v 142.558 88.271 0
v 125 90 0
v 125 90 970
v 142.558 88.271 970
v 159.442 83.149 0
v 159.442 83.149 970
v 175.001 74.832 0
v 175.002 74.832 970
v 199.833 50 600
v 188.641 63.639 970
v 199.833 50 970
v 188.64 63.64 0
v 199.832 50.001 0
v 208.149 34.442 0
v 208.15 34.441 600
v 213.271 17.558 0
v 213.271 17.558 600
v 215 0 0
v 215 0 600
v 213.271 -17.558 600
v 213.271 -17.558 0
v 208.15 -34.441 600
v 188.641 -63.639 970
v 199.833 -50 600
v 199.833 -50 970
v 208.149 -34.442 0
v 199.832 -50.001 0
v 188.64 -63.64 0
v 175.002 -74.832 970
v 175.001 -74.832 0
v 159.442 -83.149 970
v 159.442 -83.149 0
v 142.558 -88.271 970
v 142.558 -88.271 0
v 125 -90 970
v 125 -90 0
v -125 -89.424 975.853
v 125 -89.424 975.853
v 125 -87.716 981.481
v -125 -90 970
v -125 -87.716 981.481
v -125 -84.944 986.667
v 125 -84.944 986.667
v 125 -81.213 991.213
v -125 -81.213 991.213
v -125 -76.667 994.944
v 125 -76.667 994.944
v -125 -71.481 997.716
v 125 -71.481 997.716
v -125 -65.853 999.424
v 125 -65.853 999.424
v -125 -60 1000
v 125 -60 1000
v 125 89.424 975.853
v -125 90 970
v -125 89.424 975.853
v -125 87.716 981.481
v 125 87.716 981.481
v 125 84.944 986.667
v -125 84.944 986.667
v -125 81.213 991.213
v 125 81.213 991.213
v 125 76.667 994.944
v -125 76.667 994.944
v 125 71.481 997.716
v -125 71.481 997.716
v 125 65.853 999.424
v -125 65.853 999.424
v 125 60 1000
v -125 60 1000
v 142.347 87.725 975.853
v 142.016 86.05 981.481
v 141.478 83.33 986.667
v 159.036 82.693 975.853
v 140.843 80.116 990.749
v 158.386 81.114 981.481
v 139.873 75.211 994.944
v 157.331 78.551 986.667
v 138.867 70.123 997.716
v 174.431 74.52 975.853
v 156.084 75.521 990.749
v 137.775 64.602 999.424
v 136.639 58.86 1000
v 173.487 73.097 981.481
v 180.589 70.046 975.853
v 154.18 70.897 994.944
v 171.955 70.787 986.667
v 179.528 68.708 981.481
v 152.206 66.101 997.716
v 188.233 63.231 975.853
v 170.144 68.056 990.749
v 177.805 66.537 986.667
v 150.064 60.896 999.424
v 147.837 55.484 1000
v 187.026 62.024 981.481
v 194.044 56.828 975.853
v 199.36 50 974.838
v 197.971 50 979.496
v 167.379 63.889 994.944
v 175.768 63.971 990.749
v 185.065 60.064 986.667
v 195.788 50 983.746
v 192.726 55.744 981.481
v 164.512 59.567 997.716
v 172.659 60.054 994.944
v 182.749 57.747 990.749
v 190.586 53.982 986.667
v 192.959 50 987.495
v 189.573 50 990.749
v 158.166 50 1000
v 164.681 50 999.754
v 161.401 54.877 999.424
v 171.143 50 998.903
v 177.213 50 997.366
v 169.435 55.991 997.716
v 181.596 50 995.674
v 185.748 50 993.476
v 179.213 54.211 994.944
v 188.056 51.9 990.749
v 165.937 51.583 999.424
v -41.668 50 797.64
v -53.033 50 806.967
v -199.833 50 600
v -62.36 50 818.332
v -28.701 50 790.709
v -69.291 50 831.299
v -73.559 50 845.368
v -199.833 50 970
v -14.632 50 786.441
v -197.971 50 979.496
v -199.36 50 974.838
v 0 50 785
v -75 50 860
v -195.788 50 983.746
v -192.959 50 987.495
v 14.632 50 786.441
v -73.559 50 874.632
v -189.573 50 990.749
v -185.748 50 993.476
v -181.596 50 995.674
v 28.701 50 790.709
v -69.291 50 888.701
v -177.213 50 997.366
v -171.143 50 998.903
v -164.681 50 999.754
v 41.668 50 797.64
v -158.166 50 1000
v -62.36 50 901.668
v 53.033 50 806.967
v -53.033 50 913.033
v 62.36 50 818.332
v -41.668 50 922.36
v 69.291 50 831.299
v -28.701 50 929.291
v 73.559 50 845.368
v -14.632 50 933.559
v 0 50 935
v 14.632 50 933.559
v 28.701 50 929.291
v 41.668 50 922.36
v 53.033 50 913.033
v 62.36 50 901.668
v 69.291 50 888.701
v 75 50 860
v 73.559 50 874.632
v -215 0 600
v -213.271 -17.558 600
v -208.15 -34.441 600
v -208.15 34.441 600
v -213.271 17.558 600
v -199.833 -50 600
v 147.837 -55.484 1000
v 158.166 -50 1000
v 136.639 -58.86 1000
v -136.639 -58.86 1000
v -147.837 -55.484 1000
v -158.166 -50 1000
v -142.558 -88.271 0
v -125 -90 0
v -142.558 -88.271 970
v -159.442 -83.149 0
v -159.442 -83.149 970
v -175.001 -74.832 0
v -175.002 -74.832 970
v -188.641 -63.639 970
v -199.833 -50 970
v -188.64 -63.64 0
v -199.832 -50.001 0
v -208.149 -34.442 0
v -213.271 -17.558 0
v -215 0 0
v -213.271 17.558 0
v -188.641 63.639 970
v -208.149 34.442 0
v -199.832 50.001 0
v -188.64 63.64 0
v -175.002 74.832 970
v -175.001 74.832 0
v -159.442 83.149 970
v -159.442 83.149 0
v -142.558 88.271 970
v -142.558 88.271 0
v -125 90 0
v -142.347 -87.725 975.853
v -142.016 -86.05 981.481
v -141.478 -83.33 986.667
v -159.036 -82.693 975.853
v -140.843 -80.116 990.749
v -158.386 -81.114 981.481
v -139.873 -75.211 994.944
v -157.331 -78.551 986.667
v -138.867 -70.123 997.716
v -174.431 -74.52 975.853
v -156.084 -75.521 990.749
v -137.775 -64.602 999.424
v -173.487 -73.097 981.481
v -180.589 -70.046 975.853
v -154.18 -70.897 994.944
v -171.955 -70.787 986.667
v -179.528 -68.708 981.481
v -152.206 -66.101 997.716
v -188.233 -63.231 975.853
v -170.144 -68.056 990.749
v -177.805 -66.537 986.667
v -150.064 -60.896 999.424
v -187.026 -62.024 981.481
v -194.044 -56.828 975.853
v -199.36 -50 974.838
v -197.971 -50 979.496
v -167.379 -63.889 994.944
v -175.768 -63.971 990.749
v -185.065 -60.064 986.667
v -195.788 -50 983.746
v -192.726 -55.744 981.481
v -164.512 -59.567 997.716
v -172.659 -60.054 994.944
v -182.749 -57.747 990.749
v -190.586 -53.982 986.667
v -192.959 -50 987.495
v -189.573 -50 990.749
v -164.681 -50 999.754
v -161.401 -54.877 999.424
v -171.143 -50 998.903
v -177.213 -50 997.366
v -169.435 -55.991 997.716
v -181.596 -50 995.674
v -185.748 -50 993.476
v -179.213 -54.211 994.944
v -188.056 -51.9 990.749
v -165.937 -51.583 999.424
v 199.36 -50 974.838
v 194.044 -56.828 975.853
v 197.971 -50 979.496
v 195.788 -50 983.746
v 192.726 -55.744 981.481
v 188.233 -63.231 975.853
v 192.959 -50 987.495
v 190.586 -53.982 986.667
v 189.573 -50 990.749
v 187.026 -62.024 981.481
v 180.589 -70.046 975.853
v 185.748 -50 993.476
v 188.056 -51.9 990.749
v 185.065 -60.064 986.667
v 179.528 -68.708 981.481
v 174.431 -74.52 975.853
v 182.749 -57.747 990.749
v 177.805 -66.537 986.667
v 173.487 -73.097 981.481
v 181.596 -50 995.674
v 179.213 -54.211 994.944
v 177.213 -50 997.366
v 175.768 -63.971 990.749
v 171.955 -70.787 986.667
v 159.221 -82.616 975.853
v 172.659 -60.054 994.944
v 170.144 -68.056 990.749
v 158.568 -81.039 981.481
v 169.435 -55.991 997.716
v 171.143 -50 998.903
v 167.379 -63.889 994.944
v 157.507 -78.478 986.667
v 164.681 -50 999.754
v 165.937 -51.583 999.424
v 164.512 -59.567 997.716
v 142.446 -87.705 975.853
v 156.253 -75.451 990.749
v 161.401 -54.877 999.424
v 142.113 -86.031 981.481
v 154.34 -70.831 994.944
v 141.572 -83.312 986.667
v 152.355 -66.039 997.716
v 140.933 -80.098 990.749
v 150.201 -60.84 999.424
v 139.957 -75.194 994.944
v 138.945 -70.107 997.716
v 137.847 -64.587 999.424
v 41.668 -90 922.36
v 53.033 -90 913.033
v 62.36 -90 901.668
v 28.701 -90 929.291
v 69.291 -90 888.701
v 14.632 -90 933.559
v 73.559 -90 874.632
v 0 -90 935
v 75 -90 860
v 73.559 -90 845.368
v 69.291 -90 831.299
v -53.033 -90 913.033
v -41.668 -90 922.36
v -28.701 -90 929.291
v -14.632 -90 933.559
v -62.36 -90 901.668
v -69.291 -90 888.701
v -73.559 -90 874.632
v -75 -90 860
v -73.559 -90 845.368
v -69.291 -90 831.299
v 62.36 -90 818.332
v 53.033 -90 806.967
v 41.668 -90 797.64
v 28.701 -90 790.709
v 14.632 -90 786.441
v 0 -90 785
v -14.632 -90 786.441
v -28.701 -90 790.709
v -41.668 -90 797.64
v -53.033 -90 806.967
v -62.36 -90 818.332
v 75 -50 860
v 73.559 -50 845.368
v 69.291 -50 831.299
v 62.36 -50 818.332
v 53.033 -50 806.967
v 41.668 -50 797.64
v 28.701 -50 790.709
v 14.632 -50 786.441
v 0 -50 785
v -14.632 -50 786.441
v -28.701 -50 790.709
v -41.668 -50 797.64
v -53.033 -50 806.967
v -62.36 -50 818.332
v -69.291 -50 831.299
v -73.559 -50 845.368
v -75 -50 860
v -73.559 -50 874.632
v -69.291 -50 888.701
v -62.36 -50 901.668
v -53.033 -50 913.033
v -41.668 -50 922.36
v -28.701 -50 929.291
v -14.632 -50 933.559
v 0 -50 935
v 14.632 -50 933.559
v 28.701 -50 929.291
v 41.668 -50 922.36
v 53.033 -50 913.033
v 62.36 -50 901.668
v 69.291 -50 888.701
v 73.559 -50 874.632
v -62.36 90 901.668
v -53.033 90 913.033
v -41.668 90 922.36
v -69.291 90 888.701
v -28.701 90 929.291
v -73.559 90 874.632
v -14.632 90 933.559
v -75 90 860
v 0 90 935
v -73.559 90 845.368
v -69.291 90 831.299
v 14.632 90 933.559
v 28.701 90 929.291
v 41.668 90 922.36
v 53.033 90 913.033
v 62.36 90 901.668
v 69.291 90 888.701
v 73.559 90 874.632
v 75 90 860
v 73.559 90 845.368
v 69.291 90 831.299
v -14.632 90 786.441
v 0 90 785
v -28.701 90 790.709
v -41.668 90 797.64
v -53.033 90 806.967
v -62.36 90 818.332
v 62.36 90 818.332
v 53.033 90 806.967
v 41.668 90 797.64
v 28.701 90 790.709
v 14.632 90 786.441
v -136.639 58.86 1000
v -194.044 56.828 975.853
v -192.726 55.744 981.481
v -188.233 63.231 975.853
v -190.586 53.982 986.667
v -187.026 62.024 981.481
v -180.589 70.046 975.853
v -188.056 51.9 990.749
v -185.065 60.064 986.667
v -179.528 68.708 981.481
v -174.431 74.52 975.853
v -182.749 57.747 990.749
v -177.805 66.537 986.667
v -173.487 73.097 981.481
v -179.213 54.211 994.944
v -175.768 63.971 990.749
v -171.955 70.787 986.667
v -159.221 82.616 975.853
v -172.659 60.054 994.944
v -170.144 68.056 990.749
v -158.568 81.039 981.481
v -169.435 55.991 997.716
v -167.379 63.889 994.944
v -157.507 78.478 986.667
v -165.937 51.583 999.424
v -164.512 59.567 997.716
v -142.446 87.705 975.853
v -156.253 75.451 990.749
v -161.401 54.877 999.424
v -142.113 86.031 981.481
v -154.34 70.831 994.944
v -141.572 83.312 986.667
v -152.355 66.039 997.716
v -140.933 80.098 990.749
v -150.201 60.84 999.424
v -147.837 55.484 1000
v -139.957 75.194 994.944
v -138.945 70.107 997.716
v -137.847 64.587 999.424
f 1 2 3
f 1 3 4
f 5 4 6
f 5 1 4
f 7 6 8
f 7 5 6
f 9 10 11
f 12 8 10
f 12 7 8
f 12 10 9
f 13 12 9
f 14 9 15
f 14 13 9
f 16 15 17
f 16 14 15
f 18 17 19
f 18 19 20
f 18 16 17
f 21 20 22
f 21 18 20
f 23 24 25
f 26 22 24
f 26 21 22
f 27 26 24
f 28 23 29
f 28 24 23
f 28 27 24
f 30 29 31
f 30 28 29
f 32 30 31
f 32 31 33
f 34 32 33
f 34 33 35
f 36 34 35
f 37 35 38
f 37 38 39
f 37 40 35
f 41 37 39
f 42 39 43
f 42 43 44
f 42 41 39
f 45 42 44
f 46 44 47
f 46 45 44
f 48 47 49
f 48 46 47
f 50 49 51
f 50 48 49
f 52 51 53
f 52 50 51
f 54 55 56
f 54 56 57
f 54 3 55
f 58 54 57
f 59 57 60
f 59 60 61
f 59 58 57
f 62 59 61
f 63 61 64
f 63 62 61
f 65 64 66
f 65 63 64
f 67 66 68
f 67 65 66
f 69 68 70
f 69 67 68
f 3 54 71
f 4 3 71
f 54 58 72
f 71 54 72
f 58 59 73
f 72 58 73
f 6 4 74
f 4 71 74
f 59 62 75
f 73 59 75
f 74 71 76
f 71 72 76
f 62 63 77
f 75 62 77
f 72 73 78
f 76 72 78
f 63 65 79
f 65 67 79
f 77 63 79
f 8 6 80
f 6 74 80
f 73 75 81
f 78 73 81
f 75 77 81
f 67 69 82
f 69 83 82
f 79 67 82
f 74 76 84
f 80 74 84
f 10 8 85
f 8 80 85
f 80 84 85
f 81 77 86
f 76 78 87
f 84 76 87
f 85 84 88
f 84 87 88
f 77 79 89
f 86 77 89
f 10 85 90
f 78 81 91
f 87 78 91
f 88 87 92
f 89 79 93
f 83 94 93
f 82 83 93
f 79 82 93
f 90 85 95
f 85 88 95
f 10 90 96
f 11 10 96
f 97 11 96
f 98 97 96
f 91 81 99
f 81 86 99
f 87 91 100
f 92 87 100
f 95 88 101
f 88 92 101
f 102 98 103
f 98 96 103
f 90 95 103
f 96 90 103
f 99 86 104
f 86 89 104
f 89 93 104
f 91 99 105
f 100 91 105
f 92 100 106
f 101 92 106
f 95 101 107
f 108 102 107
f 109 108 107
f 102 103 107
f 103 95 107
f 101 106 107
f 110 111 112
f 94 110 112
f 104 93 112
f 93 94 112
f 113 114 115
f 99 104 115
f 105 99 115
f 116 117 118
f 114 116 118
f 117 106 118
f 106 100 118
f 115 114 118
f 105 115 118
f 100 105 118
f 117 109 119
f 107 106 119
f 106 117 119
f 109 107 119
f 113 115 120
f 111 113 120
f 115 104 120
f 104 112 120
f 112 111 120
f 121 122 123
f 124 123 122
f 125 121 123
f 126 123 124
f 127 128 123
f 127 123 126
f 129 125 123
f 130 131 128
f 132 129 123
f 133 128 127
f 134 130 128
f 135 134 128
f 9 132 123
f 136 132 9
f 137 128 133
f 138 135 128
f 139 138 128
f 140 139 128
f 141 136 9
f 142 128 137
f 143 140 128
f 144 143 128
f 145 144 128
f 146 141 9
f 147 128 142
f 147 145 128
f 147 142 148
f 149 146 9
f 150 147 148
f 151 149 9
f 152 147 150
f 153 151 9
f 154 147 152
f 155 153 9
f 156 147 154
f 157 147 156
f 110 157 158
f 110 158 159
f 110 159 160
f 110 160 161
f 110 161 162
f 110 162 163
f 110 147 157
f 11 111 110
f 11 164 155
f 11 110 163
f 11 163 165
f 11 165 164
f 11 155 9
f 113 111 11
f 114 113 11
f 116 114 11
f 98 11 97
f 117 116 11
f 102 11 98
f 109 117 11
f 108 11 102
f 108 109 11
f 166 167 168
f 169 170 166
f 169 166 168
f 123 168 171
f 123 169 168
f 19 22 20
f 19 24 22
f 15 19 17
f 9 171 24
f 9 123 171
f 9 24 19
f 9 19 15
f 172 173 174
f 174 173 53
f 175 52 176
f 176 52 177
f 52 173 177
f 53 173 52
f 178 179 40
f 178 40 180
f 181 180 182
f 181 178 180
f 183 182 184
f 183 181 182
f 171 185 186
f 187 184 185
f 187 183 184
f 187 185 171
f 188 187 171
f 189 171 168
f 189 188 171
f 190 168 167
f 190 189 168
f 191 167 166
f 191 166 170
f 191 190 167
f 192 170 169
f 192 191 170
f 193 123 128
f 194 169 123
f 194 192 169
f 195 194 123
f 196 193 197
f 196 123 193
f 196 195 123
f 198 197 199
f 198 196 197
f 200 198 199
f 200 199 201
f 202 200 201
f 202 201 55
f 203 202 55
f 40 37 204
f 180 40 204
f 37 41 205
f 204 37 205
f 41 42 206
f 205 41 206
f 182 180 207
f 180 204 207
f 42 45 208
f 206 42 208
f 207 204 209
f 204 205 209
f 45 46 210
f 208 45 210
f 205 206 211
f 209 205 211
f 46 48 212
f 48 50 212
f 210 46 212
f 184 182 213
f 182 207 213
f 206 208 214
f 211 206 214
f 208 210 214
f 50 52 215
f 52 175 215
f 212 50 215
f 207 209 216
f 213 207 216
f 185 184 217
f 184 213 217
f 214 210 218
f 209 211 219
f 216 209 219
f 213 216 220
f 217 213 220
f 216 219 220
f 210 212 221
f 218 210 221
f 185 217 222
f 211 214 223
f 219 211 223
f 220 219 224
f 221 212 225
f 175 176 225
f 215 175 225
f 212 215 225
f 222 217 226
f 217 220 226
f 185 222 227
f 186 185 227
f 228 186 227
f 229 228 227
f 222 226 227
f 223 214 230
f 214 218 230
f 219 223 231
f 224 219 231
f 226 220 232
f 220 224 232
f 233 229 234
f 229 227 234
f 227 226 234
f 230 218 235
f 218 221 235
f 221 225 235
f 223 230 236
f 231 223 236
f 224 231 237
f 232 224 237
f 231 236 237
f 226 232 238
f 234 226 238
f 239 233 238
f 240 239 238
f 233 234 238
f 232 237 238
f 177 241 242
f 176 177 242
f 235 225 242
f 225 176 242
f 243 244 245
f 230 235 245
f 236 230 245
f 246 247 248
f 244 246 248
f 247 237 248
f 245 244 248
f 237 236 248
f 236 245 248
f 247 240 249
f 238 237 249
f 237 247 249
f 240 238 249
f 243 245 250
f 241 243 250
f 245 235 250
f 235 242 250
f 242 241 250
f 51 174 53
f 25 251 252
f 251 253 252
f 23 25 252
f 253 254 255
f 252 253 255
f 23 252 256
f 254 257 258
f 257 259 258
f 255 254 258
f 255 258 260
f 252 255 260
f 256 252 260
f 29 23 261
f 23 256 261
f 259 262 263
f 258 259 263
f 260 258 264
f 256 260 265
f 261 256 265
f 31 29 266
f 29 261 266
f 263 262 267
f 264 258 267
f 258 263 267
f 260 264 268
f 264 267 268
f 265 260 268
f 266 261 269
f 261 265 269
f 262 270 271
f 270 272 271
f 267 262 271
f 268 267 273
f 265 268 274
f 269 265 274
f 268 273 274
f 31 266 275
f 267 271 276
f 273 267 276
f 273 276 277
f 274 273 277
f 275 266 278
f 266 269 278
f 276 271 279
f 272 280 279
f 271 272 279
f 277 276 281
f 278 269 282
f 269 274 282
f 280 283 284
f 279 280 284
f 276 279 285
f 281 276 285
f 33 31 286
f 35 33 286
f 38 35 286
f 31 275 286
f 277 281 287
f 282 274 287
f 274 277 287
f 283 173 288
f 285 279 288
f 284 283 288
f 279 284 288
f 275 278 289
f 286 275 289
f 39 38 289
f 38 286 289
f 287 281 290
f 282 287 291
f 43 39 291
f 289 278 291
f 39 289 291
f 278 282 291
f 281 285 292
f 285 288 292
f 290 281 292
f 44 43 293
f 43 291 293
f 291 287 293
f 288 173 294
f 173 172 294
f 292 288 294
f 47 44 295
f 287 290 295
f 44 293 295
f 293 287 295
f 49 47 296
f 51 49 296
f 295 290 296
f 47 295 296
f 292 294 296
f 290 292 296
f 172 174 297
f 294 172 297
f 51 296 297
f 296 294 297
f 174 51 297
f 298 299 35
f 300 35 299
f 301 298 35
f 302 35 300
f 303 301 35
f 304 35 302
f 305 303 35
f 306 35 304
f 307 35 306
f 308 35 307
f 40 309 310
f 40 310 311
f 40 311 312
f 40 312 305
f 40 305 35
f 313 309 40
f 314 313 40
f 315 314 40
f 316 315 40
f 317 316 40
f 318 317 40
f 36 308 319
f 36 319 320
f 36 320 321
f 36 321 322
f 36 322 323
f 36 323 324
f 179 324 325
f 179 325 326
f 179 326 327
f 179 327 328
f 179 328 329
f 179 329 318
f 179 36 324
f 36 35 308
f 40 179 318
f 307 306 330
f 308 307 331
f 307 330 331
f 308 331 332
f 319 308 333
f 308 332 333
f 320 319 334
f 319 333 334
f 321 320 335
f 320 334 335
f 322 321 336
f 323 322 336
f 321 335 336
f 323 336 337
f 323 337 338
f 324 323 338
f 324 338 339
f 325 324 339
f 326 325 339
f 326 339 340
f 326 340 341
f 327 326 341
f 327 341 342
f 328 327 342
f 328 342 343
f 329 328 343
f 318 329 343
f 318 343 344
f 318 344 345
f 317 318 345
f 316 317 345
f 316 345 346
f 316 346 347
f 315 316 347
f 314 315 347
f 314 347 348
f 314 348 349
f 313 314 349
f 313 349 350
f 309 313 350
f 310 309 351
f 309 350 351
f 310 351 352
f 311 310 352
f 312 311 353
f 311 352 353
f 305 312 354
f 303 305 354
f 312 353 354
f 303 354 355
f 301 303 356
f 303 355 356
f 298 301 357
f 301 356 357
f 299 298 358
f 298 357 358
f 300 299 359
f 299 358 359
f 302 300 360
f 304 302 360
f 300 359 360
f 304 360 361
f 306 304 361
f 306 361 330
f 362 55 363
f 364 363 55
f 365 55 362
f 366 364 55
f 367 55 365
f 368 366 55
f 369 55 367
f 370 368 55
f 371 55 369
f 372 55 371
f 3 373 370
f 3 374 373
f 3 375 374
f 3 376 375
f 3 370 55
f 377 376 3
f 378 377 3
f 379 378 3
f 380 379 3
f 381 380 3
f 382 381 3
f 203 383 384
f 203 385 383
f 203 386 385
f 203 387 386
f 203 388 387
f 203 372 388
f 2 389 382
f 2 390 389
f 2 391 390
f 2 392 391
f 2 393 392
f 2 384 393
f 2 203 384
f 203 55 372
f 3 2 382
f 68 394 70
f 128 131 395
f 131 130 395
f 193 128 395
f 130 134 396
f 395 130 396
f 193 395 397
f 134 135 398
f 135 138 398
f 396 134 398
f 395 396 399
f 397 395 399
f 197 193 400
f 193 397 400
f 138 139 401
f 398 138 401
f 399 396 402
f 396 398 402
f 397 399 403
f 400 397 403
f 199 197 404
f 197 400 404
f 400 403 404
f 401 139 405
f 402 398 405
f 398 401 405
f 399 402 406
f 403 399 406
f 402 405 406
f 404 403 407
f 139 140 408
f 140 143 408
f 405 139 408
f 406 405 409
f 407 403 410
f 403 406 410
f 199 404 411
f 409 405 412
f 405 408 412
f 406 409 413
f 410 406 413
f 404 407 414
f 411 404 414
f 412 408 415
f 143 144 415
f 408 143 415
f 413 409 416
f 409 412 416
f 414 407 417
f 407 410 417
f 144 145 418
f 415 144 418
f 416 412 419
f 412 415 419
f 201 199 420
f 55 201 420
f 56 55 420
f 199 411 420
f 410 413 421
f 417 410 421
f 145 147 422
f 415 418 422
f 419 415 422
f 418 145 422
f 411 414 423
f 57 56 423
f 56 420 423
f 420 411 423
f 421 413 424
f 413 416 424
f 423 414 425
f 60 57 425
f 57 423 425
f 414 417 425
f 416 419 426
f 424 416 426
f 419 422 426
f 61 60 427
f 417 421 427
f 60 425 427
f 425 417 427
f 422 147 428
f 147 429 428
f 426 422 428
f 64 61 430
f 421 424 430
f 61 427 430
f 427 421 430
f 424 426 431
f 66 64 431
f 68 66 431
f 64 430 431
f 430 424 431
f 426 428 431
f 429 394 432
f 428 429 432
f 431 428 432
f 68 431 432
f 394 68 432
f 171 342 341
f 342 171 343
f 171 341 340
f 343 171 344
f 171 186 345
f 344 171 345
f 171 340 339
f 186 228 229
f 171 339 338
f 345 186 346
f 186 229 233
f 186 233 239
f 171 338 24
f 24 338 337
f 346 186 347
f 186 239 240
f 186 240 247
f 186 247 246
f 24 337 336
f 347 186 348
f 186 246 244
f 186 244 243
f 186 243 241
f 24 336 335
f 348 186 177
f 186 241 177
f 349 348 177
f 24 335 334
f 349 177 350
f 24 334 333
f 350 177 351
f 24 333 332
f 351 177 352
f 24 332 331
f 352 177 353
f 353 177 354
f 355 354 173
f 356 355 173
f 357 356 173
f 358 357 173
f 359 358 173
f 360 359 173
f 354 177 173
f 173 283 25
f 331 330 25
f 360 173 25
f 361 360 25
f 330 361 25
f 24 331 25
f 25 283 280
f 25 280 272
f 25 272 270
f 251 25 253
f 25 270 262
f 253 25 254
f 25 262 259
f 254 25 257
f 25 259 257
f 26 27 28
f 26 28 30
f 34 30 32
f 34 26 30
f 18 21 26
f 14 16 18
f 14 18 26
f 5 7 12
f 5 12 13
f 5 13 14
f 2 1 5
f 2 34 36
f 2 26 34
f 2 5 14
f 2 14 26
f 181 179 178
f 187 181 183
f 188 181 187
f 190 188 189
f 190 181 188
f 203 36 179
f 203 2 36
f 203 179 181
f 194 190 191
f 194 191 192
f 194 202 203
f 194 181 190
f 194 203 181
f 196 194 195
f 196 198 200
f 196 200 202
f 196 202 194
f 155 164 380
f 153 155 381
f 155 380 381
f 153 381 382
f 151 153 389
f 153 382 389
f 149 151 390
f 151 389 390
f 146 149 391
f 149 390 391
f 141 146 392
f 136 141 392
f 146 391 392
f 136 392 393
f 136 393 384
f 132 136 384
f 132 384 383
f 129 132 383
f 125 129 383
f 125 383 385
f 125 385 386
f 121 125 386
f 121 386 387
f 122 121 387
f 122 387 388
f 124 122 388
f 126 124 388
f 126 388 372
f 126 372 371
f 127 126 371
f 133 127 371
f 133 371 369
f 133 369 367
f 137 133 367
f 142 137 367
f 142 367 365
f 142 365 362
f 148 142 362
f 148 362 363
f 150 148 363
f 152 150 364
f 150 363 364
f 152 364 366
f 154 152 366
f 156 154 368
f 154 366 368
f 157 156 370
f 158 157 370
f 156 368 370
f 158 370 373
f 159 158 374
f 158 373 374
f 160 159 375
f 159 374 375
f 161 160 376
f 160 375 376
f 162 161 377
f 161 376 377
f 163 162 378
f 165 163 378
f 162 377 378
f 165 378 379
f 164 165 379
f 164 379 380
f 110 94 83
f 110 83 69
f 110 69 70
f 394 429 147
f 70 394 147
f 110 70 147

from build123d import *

# Parameters (mm, degrees)
BOSS_EXTRUDE1_DEPTH = 1000
FILLET1_R           = 30
SKETCH2_W           = 431.388380784
SKETCH2_H           = 100
CUT_EXTRUDE1_DEPTH  = 400
SKETCH3_R           = 75
CUT_EXTRUDE2_DEPTH  = 181.0000001


with BuildPart() as part:
    # Sketch1 → Boss-Extrude1 (new body)
    with BuildSketch(Plane.XY):
        with BuildLine():
            Line((-125, 90), (125, 90))
            ThreePointArc((125, 90), (215, 0), (125, -90))
            Line((125, -90), (-125, -90))
            ThreePointArc((-125, -90), (-215, 0), (-125, 90))
        make_face()
    extrude(amount=BOSS_EXTRUDE1_DEPTH)

    # Fillet1
    fillet1_edges = [part.edges().sort_by_distance(p)[0] for p in [
        (215, 0, 1000),
        (0, 90, 1000),
        (-215, 0, 1000),
        (0, -90, 1000),
    ]]
    fillet(fillet1_edges, radius=FILLET1_R)

    # Sketch2 → Cut-Extrude1 (cut)
    with BuildSketch(Plane.XY.offset(1000)):
        with Locations((-0.091183766, 0)):
            Rectangle(SKETCH2_W, SKETCH2_H)
    extrude(amount=-CUT_EXTRUDE1_DEPTH, mode=Mode.SUBTRACT)

    # Sketch3 → Cut-Extrude2 (cut, through all)
    with BuildSketch(Plane(origin=(0, 90, 0), x_dir=(1, 0, 0), z_dir=(0, 1, 0))):
        with Locations((0, -860)):
            Circle(SKETCH3_R)
    extrude(amount=-CUT_EXTRUDE2_DEPTH, mode=Mode.SUBTRACT)


solid = part.part
